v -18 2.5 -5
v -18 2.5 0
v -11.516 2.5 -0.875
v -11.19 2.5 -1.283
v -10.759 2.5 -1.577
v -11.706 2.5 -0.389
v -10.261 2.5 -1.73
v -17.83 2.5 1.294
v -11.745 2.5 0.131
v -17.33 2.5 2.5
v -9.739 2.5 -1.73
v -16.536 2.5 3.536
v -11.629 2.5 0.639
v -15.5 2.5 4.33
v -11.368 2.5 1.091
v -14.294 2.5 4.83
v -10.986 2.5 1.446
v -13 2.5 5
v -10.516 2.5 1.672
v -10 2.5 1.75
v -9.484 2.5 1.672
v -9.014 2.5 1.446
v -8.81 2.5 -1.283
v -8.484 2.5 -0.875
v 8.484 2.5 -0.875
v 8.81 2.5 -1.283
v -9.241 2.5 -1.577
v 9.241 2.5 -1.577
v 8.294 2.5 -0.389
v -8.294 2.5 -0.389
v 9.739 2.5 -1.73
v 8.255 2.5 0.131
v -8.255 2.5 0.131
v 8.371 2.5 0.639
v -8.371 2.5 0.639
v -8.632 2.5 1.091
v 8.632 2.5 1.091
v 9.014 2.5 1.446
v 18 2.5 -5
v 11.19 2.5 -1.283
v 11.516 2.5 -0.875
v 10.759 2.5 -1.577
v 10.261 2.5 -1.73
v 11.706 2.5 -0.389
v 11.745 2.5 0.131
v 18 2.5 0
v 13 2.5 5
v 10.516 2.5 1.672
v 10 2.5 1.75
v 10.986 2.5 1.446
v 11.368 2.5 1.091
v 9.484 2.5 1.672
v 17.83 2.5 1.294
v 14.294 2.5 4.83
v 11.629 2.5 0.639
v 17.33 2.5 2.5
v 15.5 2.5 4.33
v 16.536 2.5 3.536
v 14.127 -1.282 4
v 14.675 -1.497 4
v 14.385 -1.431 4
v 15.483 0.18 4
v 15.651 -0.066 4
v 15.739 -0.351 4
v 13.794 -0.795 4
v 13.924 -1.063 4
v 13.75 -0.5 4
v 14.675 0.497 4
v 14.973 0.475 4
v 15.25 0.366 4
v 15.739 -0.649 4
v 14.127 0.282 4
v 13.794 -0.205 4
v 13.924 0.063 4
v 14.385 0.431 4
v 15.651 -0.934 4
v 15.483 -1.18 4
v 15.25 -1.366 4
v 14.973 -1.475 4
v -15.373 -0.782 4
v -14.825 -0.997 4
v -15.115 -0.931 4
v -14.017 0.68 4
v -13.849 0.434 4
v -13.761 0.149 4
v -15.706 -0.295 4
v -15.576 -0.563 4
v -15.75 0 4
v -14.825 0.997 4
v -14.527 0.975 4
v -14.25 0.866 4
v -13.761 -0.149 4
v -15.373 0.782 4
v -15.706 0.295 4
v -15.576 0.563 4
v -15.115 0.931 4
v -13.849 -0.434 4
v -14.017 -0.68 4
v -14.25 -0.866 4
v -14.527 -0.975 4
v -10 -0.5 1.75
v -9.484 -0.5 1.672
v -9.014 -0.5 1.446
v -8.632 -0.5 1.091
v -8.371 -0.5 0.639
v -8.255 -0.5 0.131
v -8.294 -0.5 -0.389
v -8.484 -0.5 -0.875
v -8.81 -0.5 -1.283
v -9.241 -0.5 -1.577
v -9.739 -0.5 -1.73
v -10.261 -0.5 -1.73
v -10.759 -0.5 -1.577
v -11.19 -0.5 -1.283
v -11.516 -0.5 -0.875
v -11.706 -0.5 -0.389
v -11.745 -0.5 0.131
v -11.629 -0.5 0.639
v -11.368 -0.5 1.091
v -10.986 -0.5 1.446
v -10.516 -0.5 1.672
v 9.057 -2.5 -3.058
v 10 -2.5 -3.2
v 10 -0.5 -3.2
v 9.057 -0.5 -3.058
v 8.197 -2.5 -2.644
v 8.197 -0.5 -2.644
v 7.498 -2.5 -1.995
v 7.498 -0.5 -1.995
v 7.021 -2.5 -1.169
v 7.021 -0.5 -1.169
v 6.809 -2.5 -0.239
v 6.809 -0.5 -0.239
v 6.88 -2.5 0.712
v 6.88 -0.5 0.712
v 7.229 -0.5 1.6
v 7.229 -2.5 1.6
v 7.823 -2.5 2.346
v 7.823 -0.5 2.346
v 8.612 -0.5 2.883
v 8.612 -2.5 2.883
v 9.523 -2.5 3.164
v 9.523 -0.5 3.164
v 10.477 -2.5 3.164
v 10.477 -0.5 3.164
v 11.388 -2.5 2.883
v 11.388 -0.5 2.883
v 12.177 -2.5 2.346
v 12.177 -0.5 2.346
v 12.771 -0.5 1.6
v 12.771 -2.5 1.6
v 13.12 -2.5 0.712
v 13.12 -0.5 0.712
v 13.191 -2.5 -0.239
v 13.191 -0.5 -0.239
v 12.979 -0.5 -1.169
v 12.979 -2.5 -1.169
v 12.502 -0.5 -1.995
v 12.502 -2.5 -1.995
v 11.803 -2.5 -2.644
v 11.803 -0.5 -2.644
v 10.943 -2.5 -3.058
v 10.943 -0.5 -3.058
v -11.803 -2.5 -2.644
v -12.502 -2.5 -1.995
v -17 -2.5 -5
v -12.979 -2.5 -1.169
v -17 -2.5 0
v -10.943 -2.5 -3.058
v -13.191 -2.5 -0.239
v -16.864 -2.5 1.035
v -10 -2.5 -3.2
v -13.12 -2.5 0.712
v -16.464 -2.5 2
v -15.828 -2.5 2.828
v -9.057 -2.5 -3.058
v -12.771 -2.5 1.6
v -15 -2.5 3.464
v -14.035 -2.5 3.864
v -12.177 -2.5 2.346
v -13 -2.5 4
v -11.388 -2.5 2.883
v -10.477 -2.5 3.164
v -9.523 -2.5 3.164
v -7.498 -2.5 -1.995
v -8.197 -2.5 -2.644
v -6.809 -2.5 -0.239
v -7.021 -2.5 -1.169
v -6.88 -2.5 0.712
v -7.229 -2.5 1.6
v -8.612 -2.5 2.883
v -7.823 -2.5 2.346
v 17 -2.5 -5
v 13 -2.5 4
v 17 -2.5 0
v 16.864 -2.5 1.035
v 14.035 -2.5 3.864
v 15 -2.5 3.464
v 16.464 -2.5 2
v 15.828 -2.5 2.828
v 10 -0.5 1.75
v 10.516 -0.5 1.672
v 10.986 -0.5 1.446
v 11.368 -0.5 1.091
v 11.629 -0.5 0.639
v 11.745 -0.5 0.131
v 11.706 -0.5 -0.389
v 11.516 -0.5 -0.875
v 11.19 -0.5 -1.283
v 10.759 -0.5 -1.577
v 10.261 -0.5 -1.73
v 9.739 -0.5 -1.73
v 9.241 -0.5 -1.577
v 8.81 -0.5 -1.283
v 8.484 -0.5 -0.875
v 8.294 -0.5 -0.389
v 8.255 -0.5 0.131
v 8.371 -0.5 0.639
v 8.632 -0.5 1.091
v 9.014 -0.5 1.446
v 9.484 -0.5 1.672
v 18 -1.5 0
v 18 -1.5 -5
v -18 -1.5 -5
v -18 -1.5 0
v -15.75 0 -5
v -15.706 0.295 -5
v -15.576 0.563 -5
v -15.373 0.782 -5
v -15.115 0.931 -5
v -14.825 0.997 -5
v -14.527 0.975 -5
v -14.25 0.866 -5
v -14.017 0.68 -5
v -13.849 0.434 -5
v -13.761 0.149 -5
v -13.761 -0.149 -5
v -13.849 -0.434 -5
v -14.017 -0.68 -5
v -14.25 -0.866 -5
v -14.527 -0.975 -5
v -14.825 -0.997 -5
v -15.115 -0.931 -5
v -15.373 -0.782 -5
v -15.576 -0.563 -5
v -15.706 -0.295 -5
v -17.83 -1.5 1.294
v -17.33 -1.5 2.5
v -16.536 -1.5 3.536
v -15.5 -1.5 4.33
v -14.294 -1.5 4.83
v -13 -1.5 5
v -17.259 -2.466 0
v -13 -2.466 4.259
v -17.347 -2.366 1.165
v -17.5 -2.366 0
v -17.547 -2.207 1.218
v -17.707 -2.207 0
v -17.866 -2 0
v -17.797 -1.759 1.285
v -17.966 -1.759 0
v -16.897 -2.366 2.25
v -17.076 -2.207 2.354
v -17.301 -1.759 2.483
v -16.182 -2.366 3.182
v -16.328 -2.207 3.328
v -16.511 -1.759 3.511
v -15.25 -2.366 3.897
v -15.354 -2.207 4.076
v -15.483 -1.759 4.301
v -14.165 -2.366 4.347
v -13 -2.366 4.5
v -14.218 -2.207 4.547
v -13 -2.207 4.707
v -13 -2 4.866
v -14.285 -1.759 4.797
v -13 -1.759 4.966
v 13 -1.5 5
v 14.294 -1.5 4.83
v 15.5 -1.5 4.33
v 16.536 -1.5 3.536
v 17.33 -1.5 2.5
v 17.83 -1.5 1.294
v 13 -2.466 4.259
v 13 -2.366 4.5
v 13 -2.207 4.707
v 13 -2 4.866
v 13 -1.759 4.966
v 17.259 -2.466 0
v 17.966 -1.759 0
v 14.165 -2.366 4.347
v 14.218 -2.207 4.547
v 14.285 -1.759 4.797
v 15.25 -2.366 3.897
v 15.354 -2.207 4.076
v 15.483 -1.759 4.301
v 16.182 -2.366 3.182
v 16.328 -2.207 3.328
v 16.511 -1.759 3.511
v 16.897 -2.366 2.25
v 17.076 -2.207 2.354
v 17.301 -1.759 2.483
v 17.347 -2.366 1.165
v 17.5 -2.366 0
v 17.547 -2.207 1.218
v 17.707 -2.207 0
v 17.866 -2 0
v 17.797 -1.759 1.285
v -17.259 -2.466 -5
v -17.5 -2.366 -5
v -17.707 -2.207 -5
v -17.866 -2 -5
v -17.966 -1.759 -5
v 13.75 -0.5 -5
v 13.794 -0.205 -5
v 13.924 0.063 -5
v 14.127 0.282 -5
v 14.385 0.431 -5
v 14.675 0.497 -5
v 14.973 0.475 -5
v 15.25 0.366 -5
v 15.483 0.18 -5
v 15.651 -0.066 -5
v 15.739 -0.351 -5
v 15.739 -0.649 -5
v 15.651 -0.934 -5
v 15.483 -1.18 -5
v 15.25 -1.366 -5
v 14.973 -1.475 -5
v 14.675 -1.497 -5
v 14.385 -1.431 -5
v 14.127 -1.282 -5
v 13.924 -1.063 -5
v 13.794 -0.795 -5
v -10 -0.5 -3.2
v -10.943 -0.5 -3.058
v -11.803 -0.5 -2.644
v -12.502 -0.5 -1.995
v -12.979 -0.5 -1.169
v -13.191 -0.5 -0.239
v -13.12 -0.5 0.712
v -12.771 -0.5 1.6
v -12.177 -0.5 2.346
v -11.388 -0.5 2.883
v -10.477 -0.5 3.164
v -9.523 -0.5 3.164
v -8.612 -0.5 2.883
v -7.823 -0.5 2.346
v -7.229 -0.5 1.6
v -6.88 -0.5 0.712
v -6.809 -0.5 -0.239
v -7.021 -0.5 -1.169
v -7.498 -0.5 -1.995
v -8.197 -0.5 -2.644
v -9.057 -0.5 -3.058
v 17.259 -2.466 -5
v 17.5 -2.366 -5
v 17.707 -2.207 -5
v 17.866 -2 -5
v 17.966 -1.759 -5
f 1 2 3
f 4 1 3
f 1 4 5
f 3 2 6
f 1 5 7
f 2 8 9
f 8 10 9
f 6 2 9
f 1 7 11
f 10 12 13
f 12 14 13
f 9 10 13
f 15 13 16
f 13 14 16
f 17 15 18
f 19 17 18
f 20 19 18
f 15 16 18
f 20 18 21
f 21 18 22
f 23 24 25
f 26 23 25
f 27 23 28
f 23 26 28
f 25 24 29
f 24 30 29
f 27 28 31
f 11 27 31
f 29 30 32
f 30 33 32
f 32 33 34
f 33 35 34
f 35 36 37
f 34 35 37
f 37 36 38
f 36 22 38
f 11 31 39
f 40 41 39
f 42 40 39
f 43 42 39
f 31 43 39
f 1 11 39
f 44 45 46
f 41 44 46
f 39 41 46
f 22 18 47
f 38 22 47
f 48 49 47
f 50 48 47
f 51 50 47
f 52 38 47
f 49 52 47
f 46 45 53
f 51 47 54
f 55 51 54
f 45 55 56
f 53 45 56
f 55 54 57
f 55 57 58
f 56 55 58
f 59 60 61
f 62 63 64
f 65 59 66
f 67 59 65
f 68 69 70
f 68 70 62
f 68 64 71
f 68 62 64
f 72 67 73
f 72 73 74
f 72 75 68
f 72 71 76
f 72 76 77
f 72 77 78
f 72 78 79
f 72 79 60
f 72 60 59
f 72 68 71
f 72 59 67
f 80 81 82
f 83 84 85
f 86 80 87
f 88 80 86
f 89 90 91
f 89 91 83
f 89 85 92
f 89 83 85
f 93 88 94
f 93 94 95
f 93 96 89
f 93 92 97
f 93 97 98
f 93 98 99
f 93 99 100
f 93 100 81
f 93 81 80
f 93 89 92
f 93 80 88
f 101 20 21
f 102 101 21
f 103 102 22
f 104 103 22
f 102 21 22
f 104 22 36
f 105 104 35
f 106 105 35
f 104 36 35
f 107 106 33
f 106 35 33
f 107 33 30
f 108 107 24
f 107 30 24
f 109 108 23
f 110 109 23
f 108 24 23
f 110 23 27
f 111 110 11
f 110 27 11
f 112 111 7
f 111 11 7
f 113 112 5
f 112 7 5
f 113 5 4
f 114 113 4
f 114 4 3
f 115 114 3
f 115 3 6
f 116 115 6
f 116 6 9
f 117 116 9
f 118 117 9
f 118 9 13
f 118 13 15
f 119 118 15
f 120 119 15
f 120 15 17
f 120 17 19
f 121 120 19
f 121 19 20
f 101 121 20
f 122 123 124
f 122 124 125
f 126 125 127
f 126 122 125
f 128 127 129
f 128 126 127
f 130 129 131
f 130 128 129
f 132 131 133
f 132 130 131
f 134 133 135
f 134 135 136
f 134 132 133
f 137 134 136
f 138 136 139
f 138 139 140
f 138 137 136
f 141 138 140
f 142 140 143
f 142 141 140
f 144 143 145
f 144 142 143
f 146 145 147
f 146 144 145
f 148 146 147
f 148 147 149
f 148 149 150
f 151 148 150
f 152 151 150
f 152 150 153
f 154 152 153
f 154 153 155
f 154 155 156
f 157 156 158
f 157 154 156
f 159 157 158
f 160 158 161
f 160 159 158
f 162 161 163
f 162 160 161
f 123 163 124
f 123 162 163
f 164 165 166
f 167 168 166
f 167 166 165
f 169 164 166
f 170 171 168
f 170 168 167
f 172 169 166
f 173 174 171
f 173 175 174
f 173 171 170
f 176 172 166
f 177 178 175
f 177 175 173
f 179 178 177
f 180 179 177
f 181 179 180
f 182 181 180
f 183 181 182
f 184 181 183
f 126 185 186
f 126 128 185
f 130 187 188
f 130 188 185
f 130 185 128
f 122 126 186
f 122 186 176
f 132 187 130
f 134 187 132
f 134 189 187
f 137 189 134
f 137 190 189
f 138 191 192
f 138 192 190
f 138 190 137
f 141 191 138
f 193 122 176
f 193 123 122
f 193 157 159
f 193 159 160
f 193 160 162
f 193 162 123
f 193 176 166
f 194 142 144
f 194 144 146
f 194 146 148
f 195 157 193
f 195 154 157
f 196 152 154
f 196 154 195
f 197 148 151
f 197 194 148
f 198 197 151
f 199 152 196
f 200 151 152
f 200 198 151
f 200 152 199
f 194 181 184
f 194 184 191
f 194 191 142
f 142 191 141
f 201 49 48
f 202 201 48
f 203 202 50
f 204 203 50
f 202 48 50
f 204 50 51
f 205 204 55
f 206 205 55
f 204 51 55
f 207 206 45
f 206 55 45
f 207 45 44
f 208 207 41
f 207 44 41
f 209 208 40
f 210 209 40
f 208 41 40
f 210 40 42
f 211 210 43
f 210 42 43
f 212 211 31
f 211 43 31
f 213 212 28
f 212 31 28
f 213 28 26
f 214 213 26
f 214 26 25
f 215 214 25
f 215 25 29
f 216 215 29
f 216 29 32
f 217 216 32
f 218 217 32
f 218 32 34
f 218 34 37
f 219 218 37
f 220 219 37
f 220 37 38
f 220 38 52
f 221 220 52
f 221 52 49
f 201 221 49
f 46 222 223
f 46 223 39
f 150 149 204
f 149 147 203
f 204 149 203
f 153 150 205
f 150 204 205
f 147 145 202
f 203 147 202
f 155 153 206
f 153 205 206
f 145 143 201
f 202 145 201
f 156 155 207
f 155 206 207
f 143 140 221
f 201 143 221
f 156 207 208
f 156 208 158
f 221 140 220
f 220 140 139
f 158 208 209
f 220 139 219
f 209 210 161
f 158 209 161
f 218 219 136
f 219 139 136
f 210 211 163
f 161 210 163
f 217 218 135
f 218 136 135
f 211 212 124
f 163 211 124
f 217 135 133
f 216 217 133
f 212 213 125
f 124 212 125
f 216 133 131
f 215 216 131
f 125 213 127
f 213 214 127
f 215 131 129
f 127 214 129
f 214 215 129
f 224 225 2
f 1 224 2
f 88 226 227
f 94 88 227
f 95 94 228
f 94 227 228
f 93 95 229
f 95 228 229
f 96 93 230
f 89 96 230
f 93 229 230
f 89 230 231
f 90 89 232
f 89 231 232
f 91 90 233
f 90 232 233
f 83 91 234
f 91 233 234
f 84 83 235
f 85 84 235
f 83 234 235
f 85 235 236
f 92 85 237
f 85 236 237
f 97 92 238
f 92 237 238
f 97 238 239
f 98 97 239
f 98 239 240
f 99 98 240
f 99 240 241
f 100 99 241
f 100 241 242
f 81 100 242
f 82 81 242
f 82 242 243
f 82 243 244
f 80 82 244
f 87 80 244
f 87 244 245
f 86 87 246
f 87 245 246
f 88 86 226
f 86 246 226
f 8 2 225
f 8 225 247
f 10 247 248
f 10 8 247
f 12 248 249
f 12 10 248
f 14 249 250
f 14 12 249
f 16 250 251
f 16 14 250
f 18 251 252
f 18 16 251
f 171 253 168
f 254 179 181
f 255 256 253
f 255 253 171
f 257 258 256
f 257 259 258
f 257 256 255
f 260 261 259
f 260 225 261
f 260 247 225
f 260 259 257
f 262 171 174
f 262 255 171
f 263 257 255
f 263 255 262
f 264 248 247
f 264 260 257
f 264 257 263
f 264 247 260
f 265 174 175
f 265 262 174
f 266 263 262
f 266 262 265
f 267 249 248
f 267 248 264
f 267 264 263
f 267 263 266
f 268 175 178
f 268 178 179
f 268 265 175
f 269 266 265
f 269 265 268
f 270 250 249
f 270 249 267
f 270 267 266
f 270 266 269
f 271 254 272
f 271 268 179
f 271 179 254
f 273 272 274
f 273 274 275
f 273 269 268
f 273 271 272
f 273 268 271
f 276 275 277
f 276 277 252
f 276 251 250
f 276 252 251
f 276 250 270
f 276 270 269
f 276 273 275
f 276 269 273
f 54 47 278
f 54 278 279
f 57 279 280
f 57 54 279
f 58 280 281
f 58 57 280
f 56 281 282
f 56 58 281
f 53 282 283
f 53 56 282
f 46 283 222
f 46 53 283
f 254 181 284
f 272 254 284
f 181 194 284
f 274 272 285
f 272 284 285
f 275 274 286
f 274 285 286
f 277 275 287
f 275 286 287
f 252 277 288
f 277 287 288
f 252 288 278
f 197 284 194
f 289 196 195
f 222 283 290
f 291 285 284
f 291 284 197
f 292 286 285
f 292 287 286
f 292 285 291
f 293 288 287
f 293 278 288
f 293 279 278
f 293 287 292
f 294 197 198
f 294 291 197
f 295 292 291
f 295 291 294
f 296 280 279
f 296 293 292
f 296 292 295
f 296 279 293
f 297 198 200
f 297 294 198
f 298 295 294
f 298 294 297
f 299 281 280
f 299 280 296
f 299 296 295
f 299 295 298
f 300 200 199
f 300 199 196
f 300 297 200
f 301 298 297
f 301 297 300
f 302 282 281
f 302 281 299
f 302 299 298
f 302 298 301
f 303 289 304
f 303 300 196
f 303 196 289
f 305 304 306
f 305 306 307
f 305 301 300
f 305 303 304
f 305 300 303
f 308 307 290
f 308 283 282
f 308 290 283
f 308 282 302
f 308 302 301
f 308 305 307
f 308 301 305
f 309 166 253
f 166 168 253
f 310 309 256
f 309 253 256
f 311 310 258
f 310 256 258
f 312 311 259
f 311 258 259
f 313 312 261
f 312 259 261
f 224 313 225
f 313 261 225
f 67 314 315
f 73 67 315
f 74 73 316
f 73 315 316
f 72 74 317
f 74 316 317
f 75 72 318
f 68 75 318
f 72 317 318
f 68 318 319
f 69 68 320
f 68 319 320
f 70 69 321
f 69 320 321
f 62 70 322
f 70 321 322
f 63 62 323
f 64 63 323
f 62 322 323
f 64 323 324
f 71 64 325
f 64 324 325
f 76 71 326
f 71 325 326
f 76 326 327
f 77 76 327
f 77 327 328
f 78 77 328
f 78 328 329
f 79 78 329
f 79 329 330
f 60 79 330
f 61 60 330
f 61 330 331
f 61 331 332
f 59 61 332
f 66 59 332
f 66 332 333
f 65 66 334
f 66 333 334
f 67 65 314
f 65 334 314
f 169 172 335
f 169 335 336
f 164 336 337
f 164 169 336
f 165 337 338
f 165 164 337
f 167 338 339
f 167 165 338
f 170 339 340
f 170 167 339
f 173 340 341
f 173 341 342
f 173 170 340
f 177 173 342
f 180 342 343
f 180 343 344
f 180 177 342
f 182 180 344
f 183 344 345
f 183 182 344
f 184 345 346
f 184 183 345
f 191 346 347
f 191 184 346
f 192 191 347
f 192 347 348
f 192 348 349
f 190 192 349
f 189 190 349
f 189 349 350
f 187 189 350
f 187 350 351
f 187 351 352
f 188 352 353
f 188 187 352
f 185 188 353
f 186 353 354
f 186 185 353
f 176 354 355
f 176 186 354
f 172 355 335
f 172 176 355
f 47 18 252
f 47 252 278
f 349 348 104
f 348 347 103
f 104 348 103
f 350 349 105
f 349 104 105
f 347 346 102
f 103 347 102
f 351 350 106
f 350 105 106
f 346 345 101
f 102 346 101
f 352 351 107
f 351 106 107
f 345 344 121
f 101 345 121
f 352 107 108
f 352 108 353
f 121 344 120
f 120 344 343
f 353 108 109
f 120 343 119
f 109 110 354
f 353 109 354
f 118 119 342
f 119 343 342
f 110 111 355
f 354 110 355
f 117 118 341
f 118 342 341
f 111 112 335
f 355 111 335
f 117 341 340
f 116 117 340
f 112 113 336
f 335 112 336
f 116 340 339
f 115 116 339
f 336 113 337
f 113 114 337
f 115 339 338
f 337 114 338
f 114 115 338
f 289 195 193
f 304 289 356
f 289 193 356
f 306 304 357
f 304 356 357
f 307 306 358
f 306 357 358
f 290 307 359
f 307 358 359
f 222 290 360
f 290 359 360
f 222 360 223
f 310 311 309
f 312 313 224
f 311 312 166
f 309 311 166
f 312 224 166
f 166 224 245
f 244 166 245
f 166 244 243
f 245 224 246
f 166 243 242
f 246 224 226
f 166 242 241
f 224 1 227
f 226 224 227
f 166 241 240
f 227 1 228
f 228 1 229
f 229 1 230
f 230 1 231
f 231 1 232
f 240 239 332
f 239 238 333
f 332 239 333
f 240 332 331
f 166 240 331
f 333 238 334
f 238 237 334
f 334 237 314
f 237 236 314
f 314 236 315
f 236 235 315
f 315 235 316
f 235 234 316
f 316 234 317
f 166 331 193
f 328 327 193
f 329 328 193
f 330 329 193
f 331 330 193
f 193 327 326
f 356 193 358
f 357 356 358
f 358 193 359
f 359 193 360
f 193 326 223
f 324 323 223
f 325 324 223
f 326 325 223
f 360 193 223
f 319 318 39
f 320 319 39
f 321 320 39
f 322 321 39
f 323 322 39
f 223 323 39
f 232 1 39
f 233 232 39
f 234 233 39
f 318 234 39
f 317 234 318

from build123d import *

# Parameters (mm, degrees)
SKETCH_1_W             = 36
SKETCH_1_H             = 5
EXTRUDE_376_DEPTH      = 5
SKETCH_4_R             = 1
I2C_DEPTH              = 9
SKETCH_5_R             = 1.75
CUT_EXTRUDE_974_DEPTH  = 20.339079606
SKETCH_6_R             = 3.2
CUT_EXTRUDE_1213_DEPTH = 2
FILLET_1_R             = 5
FILLET_2_R             = 1


with BuildPart() as part:
    # Эскиз1 → Extrude 376 (new, symmetric)
    with BuildSketch(Plane.XY):
        Rectangle(SKETCH_1_W, SKETCH_1_H)
    extrude(amount=EXTRUDE_376_DEPTH, both=True)

    # Эскиз4 → i2c (cut)
    with BuildSketch(Plane(origin=(0, 0, -5), x_dir=(-1, 0, 0), z_dir=(0, 0, -1))):
        with Locations((-14.75, -0.5)):
            Circle(SKETCH_4_R)
        with Locations((14.75, 0)):
            Circle(SKETCH_4_R)
    extrude(amount=-I2C_DEPTH, mode=Mode.SUBTRACT)

    # Эскиз5 → Cut-Extrude 974 (cut, through all)
    with BuildSketch(Plane(origin=(0, 2.5, 0), x_dir=(1, 0, 0), z_dir=(0, 1, 0))):
        with Locations(Location((-10, 0, 0), (0, 0, 270))):
            Circle(SKETCH_5_R)
        with Locations(Location((10, 0, 0), (0, 0, 270))):
            Circle(SKETCH_5_R)
    extrude(amount=-CUT_EXTRUDE_974_DEPTH, mode=Mode.SUBTRACT)

    # Эскиз6 → Cut-Extrude 1213 (cut)
    with BuildSketch(Plane(origin=(0, -2.5, 0), x_dir=(1, 0, 0), z_dir=(0, 1, 0))):
        with Locations(Location((-10, 0, 0), (0, 0, 90))):
            Circle(SKETCH_6_R)
        with Locations(Location((10, 0, 0), (0, 0, 90))):
            Circle(SKETCH_6_R)
    extrude(amount=CUT_EXTRUDE_1213_DEPTH, mode=Mode.SUBTRACT)

    # Скругление1
    fillet_1_edges = [part.edges().sort_by_distance(p)[0] for p in [
        (18, 0, 5),
        (-18, 0, 5),
    ]]
    fillet(fillet_1_edges, radius=FILLET_1_R)

    # Скругление2
    fillet_2_edges = [part.edges().sort_by_distance(p)[0] for p in [
        (0, -2.5, 5),
        (18, -2.5, -2.5),
        (-18, -2.5, -2.5),
        (16.535533906, -2.5, 3.535533906),
        (-16.535533906, -2.5, 3.535533906),
    ]]
    fillet(fillet_2_edges, radius=FILLET_2_R)


solid = part.part
